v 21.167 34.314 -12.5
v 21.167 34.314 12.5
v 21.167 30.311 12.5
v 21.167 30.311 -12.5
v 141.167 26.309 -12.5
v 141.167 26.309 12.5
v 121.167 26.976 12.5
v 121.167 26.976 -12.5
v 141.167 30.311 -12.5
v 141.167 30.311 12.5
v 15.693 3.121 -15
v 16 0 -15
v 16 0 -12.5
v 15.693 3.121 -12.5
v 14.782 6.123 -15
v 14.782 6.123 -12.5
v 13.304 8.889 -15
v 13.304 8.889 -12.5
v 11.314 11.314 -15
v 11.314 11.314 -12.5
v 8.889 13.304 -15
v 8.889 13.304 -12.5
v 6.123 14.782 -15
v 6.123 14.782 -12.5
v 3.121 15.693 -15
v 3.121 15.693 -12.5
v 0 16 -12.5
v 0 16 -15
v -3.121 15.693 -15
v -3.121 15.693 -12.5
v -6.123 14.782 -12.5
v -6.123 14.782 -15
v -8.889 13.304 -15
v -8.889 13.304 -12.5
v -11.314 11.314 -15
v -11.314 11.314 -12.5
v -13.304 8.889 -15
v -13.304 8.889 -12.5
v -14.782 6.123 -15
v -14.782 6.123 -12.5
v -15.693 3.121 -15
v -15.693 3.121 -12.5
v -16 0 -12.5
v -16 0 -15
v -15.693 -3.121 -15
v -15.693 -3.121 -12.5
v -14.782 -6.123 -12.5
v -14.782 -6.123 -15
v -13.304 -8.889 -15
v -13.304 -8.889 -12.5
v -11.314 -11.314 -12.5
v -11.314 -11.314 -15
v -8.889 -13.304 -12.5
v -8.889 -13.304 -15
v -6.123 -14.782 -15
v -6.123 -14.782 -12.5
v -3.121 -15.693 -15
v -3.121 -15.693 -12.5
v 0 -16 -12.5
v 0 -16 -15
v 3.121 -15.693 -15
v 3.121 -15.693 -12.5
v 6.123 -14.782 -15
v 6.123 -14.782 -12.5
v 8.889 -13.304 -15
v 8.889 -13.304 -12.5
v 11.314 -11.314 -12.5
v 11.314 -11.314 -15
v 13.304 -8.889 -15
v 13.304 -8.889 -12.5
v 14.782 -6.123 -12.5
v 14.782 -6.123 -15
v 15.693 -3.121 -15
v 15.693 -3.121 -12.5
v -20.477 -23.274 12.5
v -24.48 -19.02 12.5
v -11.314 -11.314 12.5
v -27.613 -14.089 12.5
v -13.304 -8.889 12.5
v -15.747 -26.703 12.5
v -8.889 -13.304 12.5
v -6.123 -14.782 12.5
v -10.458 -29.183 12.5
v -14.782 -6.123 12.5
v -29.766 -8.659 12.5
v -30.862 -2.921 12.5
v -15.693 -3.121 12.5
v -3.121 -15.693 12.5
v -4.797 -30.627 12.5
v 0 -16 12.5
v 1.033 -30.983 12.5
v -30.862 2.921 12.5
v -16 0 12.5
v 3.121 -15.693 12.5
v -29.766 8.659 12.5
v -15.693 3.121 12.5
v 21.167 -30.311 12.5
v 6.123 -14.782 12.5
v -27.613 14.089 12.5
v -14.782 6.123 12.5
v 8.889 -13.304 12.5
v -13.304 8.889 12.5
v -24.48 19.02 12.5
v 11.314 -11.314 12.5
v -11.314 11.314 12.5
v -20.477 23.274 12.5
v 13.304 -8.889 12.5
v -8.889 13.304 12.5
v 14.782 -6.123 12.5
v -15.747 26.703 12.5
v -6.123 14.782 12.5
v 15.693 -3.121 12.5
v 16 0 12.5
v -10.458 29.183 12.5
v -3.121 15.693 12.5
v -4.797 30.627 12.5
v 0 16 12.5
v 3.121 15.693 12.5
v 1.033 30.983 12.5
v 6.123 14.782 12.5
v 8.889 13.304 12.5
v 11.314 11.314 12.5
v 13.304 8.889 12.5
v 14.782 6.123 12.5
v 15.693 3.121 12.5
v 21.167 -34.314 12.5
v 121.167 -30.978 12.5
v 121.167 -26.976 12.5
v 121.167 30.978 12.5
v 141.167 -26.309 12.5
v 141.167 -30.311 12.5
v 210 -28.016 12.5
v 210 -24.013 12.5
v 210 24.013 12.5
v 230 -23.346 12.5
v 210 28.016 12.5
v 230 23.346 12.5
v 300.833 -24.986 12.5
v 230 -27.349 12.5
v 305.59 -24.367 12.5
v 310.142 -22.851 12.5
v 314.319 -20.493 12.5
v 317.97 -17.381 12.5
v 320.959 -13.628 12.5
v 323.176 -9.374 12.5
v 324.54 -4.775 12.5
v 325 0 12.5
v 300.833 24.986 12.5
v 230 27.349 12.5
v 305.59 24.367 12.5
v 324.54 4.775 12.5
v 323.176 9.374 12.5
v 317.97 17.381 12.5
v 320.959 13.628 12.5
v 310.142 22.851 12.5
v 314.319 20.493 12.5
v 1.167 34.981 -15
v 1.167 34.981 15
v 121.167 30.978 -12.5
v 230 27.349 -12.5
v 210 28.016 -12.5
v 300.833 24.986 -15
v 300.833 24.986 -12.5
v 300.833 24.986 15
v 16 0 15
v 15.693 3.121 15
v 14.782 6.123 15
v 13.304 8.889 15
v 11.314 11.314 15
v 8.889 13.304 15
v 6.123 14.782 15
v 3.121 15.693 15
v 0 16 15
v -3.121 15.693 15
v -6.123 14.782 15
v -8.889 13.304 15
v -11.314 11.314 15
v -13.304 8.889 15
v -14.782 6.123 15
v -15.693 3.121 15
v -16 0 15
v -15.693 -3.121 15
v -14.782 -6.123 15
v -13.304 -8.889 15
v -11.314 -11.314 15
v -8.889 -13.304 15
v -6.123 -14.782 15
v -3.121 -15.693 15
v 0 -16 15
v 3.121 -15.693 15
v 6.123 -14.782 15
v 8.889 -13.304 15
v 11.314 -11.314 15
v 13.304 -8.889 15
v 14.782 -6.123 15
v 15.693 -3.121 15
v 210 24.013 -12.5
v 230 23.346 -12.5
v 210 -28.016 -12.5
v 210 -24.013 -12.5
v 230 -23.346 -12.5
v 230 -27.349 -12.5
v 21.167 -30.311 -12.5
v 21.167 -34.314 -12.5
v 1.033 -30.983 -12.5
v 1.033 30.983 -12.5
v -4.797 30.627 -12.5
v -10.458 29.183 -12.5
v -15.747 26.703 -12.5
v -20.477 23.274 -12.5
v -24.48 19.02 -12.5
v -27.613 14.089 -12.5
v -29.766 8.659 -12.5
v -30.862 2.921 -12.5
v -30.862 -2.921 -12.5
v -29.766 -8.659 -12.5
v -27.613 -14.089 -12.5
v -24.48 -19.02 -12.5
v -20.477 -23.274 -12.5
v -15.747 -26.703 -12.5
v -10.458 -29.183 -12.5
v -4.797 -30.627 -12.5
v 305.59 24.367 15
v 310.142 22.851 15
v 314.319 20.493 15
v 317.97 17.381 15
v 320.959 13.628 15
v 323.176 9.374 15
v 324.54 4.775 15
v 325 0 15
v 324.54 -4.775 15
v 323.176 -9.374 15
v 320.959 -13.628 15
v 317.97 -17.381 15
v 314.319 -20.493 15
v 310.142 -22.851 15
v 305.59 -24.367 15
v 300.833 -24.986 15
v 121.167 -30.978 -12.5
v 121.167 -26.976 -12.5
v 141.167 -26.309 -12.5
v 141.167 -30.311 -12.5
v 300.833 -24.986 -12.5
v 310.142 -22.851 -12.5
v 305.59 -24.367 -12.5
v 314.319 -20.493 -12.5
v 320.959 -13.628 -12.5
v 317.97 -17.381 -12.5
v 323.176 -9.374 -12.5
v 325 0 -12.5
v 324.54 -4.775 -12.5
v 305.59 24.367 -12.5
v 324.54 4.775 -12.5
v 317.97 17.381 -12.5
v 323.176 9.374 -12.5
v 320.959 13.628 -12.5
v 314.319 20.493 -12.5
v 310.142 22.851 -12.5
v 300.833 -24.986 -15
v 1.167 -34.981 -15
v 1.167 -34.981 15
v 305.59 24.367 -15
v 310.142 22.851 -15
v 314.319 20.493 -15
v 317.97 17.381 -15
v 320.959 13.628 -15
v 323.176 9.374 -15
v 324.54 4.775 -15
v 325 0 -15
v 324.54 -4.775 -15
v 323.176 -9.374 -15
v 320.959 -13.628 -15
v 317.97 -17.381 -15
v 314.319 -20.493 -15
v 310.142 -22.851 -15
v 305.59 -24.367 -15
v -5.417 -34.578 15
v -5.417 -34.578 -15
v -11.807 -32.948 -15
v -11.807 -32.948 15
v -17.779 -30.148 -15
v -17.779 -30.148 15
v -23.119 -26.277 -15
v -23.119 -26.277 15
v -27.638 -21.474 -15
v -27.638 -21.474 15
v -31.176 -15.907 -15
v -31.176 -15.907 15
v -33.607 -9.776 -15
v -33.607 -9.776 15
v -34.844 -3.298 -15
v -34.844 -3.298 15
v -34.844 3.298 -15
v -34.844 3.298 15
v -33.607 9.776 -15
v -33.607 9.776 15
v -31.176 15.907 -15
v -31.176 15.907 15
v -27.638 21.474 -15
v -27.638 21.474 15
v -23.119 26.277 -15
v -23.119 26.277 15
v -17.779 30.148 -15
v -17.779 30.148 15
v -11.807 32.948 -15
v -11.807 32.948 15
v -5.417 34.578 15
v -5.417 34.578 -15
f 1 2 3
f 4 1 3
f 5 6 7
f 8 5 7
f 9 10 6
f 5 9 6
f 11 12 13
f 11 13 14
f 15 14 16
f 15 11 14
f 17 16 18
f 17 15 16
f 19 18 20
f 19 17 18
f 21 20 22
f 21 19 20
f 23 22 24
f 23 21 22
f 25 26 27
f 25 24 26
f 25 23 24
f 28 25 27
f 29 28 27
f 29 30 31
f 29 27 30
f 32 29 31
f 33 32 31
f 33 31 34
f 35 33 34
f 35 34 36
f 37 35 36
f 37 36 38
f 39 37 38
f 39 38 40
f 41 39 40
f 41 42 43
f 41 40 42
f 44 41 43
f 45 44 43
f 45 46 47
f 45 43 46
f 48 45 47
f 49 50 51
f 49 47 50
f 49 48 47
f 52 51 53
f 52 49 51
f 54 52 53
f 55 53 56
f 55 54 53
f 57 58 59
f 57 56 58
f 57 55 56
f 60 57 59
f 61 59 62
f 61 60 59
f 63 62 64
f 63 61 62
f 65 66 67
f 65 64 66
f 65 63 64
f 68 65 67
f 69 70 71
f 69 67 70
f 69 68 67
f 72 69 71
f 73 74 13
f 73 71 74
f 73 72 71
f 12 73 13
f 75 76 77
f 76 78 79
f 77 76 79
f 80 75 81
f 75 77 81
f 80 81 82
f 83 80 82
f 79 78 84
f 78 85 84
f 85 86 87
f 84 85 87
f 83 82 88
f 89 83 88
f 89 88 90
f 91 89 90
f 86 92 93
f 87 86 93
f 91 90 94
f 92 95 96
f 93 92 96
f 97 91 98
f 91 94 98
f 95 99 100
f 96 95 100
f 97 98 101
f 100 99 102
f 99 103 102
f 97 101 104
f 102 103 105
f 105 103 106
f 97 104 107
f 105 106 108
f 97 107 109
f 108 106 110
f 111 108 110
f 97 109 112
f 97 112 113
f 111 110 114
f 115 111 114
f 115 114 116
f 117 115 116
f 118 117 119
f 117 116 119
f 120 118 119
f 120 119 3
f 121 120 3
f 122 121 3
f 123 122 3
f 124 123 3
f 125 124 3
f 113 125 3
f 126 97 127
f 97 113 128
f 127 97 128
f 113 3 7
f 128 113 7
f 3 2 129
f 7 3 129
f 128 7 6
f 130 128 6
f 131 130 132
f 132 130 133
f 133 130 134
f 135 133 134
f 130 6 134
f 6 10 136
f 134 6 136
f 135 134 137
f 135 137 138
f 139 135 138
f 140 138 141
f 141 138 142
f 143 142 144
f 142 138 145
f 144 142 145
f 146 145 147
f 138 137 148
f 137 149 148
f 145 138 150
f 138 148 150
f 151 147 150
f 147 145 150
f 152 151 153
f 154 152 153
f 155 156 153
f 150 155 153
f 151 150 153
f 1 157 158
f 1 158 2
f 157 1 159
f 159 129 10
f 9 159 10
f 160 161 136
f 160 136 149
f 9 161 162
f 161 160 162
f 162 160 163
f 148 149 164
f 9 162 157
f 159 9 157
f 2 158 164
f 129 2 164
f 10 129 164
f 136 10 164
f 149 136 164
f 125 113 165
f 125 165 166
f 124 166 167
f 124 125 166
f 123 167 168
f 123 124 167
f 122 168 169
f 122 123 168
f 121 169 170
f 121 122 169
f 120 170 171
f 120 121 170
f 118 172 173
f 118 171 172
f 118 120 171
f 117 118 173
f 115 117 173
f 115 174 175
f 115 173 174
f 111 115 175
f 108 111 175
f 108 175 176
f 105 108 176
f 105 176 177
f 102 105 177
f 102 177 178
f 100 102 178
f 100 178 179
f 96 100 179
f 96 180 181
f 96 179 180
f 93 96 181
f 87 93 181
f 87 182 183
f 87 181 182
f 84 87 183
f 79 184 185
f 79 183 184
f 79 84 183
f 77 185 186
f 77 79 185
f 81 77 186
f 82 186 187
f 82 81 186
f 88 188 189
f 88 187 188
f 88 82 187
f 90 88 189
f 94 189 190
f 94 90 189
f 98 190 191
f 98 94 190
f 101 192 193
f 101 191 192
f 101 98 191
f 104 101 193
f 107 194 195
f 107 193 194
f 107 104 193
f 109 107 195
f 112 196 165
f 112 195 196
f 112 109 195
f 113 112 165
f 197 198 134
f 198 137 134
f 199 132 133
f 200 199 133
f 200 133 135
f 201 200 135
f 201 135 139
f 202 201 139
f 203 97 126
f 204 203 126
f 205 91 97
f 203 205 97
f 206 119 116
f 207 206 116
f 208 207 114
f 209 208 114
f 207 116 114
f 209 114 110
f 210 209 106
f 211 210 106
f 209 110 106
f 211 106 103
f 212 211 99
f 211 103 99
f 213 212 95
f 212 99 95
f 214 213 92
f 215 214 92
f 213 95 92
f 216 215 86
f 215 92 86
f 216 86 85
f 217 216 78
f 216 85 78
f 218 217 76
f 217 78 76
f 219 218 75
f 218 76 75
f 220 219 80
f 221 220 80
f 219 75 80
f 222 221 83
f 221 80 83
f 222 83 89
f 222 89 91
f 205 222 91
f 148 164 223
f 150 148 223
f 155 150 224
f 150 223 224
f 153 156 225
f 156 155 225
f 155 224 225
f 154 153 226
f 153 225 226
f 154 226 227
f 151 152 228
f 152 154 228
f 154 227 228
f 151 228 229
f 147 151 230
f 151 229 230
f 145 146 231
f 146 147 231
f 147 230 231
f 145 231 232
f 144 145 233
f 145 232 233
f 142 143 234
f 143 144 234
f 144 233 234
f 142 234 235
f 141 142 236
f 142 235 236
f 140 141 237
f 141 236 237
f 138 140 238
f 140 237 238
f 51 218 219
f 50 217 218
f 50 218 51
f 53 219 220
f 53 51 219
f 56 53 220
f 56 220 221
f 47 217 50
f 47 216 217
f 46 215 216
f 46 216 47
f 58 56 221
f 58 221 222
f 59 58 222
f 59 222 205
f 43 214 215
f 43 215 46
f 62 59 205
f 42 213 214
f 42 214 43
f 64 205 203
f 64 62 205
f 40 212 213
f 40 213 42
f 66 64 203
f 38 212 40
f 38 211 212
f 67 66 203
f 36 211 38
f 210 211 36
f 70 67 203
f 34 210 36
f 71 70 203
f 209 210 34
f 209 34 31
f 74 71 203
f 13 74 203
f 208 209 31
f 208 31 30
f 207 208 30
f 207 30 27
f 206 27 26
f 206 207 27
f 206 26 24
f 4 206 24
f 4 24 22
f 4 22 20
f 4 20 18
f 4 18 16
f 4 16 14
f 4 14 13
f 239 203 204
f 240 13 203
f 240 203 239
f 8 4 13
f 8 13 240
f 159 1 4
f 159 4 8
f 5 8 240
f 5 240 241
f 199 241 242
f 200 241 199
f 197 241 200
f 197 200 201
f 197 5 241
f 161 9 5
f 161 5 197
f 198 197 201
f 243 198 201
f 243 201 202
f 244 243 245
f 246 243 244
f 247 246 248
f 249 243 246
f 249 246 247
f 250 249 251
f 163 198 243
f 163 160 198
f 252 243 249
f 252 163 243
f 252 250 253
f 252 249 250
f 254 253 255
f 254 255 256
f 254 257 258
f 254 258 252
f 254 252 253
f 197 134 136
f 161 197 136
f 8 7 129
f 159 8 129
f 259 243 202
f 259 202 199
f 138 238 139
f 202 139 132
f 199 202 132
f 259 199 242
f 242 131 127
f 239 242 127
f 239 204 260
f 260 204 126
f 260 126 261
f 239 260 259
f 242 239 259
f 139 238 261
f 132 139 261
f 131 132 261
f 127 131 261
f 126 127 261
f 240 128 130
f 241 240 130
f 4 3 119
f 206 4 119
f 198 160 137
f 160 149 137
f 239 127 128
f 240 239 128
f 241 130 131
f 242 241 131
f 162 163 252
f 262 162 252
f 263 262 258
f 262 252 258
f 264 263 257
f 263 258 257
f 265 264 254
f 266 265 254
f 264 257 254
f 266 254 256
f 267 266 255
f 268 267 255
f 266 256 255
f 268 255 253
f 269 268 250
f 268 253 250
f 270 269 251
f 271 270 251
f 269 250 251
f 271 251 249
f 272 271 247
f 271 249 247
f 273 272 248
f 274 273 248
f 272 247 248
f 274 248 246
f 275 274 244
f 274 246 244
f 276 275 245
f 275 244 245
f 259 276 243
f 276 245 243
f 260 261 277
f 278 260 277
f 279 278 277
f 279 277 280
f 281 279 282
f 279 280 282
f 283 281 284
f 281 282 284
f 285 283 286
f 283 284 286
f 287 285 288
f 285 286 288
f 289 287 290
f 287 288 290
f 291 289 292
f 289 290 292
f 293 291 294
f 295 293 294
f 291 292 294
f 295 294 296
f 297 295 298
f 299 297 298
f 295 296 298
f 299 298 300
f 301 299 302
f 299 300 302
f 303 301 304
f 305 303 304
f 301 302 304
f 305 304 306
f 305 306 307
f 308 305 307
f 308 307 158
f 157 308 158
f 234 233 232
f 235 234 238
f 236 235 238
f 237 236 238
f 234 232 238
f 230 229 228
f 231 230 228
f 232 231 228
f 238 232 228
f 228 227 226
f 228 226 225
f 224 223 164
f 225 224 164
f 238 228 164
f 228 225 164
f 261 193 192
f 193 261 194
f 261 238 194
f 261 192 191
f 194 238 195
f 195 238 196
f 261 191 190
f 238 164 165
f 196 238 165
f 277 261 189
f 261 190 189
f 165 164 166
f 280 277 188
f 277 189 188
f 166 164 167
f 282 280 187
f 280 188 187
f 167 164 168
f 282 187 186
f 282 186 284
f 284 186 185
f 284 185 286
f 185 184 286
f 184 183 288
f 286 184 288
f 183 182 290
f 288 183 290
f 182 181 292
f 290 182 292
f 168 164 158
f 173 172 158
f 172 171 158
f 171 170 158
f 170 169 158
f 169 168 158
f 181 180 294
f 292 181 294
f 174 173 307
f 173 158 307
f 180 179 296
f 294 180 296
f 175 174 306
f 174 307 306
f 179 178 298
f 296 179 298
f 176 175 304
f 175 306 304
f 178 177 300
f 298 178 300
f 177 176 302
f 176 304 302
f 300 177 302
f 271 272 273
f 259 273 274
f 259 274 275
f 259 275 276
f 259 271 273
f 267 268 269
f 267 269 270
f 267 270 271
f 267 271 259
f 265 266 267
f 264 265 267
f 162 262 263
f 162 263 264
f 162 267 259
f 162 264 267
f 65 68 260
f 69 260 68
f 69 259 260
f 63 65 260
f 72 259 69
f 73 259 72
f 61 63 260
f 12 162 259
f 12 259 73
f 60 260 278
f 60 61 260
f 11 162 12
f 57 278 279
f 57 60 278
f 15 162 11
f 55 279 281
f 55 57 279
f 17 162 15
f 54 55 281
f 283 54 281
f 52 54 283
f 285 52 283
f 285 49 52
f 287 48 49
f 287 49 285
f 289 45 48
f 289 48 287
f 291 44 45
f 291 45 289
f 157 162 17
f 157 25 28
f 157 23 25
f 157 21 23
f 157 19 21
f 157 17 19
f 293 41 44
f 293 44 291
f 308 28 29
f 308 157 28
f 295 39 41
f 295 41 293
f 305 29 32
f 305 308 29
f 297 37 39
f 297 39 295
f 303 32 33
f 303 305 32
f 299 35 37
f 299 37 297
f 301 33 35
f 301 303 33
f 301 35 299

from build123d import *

# Parameters (mm, degrees)
EXTRUDE_1_DEPTH          = 15
CUT_EXTRUDE_1_DEPTH      = 328.223165439
CUT_EXTRUDE_1_DEPTH_BACK = 328.223165439
SKETCH_3_R               = 16
CUT_EXTRUDE_2_DEPTH      = 12.5


with BuildPart() as part:
    # Эскиз1 → Бобышка-Вытянуть1 (new, symmetric)
    with BuildSketch(Plane.XY):
        with BuildLine():
            Line((1.166666667, 34.980550151), (300.833333333, 24.986107251))
            ThreePointArc((300.833333333, 24.986107251), (325, 0), (300.833333333, -24.986107251))
            Line((300.833333333, -24.986107251), (1.166666667, -34.980550151))
            ThreePointArc((1.166666667, -34.980550151), (-35, 0), (1.166666667, 34.980550151))
        make_face()
    extrude(amount=EXTRUDE_1_DEPTH, both=True)

    # Эскиз3 → Вырез-Вытянуть1 (cut, two sides: drawn at the far end of the back side and taken through both)
    with BuildSketch(Plane.XY.offset(-CUT_EXTRUDE_1_DEPTH_BACK)):
        Circle(SKETCH_3_R)
    extrude(amount=CUT_EXTRUDE_1_DEPTH + CUT_EXTRUDE_1_DEPTH_BACK, mode=Mode.SUBTRACT)

    # Эскиз4 → Вырез-Вытянуть2 (cut, symmetric)
    with BuildSketch(Plane.XY):
        with BuildLine():
            Line((230, 23.346307109), (210, 24.013344455))
            Line((210, 24.013344455), (210, 28.015568531))
            Line((210, 28.015568531), (141.166666667, 30.31128873))
            Line((141.166666667, 30.31128873), (141.166666667, 26.309064654))
            Line((141.166666667, 26.309064654), (121.166666667, 26.976102))
            Line((121.166666667, 26.976102), (121.166666667, 30.978326076))
            Line((121.166666667, 30.978326076), (21.166666667, 34.313512805))
            Line((21.166666667, 34.313512805), (21.166666667, 30.31128873))
            Line((21.166666667, 30.31128873), (1.033333333, 30.982772991))
            ThreePointArc((1.033333333, 30.982772991), (-31, 0), (1.033333333, -30.982772991))
            Line((1.033333333, -30.982772991), (21.166666667, -30.31128873))
            Line((21.166666667, -30.31128873), (21.166666667, -34.313512805))
            Line((21.166666667, -34.313512805), (121.166666667, -30.978326076))
            Line((121.166666667, -30.978326076), (121.166666667, -26.976102))
            Line((121.166666667, -26.976102), (141.166666667, -26.309064654))
            Line((141.166666667, -26.309064654), (141.166666667, -30.31128873))
            Line((141.166666667, -30.31128873), (210, -28.015568531))
            Line((210, -28.015568531), (210, -24.013344455))
            Line((210, -24.013344455), (230, -23.346307109))
            Line((230, -23.346307109), (230, -27.348531185))
            Line((230, -27.348531185), (300.833333333, -24.986107251))
            ThreePointArc((300.833333333, -24.986107251), (325, 0), (300.833333333, 24.986107251))
            Line((300.833333333, 24.986107251), (230, 27.348531185))
            Line((230, 27.348531185), (230, 23.346307109))
        make_face()
    extrude(amount=CUT_EXTRUDE_2_DEPTH, both=True, mode=Mode.SUBTRACT)


solid = part.part
